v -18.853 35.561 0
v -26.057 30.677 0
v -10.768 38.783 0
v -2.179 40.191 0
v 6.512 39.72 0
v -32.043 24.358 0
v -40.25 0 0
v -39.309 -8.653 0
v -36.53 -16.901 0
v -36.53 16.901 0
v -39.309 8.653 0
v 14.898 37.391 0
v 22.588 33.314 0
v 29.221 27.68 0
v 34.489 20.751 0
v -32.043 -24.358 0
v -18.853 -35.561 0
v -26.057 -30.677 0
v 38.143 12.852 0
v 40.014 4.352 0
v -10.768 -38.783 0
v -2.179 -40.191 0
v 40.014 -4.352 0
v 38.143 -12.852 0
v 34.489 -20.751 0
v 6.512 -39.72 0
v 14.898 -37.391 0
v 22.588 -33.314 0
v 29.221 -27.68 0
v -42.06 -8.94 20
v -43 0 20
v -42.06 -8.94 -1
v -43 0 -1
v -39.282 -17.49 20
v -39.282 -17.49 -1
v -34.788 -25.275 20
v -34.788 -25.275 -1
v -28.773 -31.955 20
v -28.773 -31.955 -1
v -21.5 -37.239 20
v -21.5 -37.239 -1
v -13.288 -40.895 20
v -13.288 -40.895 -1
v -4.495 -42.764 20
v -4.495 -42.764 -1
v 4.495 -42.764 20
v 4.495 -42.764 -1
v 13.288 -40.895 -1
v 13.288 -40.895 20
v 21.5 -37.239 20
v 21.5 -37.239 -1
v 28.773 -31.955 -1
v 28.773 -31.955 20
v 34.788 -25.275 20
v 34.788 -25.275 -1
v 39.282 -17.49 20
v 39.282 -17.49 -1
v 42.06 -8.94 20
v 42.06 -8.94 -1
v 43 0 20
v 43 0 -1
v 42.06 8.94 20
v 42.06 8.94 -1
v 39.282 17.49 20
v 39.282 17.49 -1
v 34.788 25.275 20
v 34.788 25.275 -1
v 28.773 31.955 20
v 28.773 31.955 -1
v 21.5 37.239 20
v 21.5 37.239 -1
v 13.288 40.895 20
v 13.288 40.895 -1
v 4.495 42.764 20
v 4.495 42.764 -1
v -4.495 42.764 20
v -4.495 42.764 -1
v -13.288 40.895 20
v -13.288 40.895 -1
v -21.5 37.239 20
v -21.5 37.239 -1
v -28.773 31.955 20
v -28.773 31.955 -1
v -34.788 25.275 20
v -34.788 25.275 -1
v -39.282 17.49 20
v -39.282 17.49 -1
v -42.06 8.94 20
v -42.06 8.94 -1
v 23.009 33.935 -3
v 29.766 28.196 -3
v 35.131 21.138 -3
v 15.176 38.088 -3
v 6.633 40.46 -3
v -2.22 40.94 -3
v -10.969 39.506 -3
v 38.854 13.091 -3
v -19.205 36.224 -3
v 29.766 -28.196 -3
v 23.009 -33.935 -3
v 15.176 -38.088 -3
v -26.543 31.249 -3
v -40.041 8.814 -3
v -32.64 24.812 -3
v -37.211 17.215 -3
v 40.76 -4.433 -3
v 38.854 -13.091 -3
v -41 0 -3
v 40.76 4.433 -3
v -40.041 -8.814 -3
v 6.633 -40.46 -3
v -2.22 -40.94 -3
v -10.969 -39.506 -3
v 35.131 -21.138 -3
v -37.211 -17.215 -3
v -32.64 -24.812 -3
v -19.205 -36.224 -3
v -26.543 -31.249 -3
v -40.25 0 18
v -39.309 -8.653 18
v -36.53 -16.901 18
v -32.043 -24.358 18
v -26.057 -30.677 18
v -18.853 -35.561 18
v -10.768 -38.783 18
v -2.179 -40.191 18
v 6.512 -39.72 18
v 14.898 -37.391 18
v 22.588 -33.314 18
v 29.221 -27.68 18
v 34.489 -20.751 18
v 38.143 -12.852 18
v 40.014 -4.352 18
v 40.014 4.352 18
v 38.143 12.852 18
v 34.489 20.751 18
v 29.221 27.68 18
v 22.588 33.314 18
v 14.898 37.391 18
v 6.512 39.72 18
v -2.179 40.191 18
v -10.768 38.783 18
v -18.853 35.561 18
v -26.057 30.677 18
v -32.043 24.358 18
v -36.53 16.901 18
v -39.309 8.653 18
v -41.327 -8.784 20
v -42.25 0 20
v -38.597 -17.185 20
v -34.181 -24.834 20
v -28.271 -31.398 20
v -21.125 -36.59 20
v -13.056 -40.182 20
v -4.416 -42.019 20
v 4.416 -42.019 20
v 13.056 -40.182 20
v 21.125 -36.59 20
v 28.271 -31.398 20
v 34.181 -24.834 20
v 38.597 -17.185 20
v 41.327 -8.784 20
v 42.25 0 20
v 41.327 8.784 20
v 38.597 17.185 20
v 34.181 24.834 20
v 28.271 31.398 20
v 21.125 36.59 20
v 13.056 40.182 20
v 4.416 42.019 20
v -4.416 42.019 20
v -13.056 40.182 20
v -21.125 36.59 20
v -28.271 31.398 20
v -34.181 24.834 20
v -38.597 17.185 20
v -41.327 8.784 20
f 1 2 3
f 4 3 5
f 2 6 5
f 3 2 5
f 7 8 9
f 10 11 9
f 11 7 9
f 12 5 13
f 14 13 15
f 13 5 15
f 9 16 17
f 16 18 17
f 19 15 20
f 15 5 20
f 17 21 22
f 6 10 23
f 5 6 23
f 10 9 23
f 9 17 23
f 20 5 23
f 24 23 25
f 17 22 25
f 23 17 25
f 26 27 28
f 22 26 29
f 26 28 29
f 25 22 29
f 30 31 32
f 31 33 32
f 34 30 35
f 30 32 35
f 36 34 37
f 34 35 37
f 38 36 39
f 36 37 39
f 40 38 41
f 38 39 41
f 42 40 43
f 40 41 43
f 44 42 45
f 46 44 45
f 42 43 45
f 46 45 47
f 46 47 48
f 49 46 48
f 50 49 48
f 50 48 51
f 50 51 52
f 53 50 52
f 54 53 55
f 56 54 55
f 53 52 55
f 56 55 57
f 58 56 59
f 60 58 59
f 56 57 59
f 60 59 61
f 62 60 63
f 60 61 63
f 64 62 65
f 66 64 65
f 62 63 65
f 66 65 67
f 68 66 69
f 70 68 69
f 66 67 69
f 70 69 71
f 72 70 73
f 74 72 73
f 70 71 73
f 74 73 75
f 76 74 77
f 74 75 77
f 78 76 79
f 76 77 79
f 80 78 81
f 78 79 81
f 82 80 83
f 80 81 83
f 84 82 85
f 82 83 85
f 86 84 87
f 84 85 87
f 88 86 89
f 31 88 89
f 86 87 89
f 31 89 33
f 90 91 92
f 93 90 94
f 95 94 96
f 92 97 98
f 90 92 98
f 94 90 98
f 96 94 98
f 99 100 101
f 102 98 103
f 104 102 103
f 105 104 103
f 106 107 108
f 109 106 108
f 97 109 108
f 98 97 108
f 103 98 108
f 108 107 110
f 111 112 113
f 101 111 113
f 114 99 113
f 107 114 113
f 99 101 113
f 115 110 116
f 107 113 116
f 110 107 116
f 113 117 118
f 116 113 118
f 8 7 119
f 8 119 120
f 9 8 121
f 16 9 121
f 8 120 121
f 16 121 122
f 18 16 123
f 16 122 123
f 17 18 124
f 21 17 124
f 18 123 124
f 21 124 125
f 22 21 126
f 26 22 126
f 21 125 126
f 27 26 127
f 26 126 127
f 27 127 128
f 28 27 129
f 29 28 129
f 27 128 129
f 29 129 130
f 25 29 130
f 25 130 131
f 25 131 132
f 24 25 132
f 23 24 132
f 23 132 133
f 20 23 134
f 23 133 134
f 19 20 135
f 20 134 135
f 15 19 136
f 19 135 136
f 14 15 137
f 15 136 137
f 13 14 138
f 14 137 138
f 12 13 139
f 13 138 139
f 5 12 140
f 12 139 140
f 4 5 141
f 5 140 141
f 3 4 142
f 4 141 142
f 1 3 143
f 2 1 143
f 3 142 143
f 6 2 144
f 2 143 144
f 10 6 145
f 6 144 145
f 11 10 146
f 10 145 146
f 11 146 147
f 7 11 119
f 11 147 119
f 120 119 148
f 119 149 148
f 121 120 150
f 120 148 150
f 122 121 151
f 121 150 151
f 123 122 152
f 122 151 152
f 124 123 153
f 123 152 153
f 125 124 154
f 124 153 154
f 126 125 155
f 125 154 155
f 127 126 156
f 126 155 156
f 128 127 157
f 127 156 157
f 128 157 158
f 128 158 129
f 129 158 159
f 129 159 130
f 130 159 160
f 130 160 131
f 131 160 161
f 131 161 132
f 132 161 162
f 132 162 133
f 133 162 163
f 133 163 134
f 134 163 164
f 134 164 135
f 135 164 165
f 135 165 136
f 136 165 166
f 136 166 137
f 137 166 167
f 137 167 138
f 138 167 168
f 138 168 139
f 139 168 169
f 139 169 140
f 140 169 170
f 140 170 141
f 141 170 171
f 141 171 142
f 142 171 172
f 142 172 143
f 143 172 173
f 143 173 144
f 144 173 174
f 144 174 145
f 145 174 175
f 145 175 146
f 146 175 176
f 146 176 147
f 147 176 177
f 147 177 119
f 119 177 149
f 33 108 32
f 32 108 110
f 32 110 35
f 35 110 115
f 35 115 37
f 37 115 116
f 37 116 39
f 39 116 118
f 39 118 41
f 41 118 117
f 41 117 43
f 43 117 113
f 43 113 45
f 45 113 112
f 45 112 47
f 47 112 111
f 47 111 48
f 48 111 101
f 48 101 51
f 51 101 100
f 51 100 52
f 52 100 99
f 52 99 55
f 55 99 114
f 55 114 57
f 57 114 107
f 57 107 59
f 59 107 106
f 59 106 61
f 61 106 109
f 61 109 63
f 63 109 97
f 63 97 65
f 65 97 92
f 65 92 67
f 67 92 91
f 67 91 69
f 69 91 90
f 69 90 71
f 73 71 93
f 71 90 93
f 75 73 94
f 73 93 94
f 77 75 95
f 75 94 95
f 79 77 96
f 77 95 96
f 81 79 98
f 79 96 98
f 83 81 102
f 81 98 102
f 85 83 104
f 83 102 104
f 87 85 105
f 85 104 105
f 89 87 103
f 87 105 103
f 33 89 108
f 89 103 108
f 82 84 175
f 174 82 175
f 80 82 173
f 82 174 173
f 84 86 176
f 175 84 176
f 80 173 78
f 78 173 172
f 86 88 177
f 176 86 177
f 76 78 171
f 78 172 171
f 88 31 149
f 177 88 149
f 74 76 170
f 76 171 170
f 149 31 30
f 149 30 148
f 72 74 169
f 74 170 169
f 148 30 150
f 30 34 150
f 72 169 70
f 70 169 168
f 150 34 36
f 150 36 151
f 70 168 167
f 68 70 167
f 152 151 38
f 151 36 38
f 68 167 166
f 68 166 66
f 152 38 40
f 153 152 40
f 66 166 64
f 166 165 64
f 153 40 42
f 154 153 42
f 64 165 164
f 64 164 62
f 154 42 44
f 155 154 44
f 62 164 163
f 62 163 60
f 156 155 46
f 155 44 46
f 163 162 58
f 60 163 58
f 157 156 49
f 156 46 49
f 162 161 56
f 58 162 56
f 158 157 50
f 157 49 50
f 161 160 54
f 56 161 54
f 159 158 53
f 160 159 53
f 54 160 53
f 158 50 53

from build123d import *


with BuildPart() as part:
    # Esquisse1 → Révolution1 (revolve)
    with BuildSketch(Plane(origin=(0, 0, 0), x_dir=(0, 0, -1), z_dir=(1, 0, 0)), mode=Mode.PRIVATE) as r_volution1_sk:
        Polygon((0, 0), (0, 40.25), (-18, 40.25), (-20, 42.25), (-20, 43), (1, 43), (3, 41), (3, 0), align=None)
    revolve(r_volution1_sk.sketch.rotate(Axis((0, 0, -3), (0, 0, 1)), 90), axis=Axis((0, 0, -3), (0, 0, 1)))  # turned: the seam where the file's is


solid = part.part
